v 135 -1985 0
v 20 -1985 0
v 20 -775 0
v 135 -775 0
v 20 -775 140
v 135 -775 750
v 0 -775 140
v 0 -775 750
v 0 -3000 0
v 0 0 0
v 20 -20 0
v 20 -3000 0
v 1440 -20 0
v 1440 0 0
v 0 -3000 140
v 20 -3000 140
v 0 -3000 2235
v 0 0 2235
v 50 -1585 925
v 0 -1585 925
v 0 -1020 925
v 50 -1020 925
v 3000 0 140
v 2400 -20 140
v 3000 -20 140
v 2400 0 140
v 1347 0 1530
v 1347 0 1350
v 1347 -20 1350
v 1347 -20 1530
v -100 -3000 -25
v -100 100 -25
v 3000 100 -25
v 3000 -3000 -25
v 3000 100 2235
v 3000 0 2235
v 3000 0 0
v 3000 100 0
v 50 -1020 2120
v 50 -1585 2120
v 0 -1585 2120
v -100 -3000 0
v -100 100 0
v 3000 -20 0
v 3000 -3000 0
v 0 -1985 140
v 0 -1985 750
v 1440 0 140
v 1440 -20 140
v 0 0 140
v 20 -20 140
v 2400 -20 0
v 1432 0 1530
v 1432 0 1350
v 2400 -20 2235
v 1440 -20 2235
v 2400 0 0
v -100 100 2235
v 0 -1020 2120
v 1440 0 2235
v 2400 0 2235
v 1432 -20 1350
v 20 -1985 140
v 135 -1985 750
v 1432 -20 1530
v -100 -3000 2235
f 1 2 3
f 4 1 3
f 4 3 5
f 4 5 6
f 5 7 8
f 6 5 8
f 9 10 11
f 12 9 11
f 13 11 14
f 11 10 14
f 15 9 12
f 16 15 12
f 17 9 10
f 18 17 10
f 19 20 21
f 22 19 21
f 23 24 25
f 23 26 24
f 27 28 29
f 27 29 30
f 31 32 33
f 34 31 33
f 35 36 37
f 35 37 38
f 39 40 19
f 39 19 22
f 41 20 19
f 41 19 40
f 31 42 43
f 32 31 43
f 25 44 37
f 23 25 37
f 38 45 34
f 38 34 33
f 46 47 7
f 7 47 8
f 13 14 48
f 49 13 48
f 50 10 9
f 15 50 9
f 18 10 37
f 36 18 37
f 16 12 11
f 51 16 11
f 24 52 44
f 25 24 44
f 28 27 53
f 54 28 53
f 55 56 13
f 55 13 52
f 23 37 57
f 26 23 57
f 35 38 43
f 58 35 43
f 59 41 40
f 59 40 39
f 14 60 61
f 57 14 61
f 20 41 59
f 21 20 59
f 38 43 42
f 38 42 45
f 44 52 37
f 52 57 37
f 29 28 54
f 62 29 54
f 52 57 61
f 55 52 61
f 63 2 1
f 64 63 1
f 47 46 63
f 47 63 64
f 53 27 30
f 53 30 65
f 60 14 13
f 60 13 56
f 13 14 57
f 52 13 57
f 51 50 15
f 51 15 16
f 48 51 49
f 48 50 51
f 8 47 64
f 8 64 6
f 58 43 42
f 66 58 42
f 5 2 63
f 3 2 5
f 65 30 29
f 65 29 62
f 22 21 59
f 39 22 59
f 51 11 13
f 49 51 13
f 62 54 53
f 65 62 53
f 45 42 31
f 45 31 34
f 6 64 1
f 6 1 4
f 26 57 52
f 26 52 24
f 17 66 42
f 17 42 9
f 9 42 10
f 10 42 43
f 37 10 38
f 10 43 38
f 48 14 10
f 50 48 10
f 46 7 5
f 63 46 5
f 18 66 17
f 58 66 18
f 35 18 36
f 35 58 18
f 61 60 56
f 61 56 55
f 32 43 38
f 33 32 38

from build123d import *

# Parameters (mm, degrees)
F1_DEPTH  = 2235
F2_W      = 960
F2_H      = 2235
F3_DEPTH  = 20
F4_W      = 1210
F4_H      = 750
F5_DEPTH  = 135
F6_W      = 565
F6_H      = 1195
F7_DEPTH  = 50
F9_DEPTH  = 140
F12_W     = 85
F12_H     = 180
F13_DEPTH = 20
F14_W     = 3100
F14_H     = 3100
F15_DEPTH = 25


with BuildPart() as f1:
    # F0 (on Top) → F1 (new body)
    with BuildSketch(Plane.XY):
        Polygon((-100, -3000), (0, -3000), (0, 0), (3000, 0), (3000, 100), (-100, 100), align=None)
    extrude(amount=F1_DEPTH)


with BuildPart() as f3:
    # F2 (on face) → F3 (new body)
    with BuildSketch(Plane.XZ):
        with Locations((1920, 1117.5)):
            Rectangle(F2_W, F2_H)
    extrude(amount=F3_DEPTH)


with BuildPart() as f5:
    # F4 (on face) → F5 (new body)
    with BuildSketch(Plane.YZ):
        with Locations((-1380, 375)):
            Rectangle(F4_W, F4_H)
    extrude(amount=F5_DEPTH)


with BuildPart() as f7:
    # F6 (on face) → F7 (new body)
    with BuildSketch(Plane.YZ):
        with Locations((-1302.5, 1522.5)):
            Rectangle(F6_W, F6_H)
    extrude(amount=F7_DEPTH)


with BuildPart() as f9:
    # F8 (on Top) → F9 (new body)
    with BuildSketch(Plane.XY):
        Polygon((3000, -20), (3000, 0), (0, 0), (0, -3000), (20, -3000), (20, -20), align=None)
    extrude(amount=F9_DEPTH)

    # F11: cut F3
    add(f3.part, mode=Mode.SUBTRACT)


with BuildPart() as f5_1:
    add(f5.part)

    # F10: cut F9
    add(f9.part, mode=Mode.SUBTRACT)


with BuildPart() as f13:
    # F12 (on face) → F13 (new body, through all)
    with BuildSketch(Plane.XZ):
        with Locations((1389.5, 1440)):
            Rectangle(F12_W, F12_H)
    extrude(amount=F13_DEPTH)


with BuildPart() as f15:
    # F14 (on Top) → F15 (new body)
    with BuildSketch(Plane.XY):
        with Locations((1450, -1450)):
            Rectangle(F14_W, F14_H)
    extrude(amount=-F15_DEPTH)


solid = Compound([f1.part, f3.part, f7.part, f9.part, f5_1.part, f13.part, f15.part])
